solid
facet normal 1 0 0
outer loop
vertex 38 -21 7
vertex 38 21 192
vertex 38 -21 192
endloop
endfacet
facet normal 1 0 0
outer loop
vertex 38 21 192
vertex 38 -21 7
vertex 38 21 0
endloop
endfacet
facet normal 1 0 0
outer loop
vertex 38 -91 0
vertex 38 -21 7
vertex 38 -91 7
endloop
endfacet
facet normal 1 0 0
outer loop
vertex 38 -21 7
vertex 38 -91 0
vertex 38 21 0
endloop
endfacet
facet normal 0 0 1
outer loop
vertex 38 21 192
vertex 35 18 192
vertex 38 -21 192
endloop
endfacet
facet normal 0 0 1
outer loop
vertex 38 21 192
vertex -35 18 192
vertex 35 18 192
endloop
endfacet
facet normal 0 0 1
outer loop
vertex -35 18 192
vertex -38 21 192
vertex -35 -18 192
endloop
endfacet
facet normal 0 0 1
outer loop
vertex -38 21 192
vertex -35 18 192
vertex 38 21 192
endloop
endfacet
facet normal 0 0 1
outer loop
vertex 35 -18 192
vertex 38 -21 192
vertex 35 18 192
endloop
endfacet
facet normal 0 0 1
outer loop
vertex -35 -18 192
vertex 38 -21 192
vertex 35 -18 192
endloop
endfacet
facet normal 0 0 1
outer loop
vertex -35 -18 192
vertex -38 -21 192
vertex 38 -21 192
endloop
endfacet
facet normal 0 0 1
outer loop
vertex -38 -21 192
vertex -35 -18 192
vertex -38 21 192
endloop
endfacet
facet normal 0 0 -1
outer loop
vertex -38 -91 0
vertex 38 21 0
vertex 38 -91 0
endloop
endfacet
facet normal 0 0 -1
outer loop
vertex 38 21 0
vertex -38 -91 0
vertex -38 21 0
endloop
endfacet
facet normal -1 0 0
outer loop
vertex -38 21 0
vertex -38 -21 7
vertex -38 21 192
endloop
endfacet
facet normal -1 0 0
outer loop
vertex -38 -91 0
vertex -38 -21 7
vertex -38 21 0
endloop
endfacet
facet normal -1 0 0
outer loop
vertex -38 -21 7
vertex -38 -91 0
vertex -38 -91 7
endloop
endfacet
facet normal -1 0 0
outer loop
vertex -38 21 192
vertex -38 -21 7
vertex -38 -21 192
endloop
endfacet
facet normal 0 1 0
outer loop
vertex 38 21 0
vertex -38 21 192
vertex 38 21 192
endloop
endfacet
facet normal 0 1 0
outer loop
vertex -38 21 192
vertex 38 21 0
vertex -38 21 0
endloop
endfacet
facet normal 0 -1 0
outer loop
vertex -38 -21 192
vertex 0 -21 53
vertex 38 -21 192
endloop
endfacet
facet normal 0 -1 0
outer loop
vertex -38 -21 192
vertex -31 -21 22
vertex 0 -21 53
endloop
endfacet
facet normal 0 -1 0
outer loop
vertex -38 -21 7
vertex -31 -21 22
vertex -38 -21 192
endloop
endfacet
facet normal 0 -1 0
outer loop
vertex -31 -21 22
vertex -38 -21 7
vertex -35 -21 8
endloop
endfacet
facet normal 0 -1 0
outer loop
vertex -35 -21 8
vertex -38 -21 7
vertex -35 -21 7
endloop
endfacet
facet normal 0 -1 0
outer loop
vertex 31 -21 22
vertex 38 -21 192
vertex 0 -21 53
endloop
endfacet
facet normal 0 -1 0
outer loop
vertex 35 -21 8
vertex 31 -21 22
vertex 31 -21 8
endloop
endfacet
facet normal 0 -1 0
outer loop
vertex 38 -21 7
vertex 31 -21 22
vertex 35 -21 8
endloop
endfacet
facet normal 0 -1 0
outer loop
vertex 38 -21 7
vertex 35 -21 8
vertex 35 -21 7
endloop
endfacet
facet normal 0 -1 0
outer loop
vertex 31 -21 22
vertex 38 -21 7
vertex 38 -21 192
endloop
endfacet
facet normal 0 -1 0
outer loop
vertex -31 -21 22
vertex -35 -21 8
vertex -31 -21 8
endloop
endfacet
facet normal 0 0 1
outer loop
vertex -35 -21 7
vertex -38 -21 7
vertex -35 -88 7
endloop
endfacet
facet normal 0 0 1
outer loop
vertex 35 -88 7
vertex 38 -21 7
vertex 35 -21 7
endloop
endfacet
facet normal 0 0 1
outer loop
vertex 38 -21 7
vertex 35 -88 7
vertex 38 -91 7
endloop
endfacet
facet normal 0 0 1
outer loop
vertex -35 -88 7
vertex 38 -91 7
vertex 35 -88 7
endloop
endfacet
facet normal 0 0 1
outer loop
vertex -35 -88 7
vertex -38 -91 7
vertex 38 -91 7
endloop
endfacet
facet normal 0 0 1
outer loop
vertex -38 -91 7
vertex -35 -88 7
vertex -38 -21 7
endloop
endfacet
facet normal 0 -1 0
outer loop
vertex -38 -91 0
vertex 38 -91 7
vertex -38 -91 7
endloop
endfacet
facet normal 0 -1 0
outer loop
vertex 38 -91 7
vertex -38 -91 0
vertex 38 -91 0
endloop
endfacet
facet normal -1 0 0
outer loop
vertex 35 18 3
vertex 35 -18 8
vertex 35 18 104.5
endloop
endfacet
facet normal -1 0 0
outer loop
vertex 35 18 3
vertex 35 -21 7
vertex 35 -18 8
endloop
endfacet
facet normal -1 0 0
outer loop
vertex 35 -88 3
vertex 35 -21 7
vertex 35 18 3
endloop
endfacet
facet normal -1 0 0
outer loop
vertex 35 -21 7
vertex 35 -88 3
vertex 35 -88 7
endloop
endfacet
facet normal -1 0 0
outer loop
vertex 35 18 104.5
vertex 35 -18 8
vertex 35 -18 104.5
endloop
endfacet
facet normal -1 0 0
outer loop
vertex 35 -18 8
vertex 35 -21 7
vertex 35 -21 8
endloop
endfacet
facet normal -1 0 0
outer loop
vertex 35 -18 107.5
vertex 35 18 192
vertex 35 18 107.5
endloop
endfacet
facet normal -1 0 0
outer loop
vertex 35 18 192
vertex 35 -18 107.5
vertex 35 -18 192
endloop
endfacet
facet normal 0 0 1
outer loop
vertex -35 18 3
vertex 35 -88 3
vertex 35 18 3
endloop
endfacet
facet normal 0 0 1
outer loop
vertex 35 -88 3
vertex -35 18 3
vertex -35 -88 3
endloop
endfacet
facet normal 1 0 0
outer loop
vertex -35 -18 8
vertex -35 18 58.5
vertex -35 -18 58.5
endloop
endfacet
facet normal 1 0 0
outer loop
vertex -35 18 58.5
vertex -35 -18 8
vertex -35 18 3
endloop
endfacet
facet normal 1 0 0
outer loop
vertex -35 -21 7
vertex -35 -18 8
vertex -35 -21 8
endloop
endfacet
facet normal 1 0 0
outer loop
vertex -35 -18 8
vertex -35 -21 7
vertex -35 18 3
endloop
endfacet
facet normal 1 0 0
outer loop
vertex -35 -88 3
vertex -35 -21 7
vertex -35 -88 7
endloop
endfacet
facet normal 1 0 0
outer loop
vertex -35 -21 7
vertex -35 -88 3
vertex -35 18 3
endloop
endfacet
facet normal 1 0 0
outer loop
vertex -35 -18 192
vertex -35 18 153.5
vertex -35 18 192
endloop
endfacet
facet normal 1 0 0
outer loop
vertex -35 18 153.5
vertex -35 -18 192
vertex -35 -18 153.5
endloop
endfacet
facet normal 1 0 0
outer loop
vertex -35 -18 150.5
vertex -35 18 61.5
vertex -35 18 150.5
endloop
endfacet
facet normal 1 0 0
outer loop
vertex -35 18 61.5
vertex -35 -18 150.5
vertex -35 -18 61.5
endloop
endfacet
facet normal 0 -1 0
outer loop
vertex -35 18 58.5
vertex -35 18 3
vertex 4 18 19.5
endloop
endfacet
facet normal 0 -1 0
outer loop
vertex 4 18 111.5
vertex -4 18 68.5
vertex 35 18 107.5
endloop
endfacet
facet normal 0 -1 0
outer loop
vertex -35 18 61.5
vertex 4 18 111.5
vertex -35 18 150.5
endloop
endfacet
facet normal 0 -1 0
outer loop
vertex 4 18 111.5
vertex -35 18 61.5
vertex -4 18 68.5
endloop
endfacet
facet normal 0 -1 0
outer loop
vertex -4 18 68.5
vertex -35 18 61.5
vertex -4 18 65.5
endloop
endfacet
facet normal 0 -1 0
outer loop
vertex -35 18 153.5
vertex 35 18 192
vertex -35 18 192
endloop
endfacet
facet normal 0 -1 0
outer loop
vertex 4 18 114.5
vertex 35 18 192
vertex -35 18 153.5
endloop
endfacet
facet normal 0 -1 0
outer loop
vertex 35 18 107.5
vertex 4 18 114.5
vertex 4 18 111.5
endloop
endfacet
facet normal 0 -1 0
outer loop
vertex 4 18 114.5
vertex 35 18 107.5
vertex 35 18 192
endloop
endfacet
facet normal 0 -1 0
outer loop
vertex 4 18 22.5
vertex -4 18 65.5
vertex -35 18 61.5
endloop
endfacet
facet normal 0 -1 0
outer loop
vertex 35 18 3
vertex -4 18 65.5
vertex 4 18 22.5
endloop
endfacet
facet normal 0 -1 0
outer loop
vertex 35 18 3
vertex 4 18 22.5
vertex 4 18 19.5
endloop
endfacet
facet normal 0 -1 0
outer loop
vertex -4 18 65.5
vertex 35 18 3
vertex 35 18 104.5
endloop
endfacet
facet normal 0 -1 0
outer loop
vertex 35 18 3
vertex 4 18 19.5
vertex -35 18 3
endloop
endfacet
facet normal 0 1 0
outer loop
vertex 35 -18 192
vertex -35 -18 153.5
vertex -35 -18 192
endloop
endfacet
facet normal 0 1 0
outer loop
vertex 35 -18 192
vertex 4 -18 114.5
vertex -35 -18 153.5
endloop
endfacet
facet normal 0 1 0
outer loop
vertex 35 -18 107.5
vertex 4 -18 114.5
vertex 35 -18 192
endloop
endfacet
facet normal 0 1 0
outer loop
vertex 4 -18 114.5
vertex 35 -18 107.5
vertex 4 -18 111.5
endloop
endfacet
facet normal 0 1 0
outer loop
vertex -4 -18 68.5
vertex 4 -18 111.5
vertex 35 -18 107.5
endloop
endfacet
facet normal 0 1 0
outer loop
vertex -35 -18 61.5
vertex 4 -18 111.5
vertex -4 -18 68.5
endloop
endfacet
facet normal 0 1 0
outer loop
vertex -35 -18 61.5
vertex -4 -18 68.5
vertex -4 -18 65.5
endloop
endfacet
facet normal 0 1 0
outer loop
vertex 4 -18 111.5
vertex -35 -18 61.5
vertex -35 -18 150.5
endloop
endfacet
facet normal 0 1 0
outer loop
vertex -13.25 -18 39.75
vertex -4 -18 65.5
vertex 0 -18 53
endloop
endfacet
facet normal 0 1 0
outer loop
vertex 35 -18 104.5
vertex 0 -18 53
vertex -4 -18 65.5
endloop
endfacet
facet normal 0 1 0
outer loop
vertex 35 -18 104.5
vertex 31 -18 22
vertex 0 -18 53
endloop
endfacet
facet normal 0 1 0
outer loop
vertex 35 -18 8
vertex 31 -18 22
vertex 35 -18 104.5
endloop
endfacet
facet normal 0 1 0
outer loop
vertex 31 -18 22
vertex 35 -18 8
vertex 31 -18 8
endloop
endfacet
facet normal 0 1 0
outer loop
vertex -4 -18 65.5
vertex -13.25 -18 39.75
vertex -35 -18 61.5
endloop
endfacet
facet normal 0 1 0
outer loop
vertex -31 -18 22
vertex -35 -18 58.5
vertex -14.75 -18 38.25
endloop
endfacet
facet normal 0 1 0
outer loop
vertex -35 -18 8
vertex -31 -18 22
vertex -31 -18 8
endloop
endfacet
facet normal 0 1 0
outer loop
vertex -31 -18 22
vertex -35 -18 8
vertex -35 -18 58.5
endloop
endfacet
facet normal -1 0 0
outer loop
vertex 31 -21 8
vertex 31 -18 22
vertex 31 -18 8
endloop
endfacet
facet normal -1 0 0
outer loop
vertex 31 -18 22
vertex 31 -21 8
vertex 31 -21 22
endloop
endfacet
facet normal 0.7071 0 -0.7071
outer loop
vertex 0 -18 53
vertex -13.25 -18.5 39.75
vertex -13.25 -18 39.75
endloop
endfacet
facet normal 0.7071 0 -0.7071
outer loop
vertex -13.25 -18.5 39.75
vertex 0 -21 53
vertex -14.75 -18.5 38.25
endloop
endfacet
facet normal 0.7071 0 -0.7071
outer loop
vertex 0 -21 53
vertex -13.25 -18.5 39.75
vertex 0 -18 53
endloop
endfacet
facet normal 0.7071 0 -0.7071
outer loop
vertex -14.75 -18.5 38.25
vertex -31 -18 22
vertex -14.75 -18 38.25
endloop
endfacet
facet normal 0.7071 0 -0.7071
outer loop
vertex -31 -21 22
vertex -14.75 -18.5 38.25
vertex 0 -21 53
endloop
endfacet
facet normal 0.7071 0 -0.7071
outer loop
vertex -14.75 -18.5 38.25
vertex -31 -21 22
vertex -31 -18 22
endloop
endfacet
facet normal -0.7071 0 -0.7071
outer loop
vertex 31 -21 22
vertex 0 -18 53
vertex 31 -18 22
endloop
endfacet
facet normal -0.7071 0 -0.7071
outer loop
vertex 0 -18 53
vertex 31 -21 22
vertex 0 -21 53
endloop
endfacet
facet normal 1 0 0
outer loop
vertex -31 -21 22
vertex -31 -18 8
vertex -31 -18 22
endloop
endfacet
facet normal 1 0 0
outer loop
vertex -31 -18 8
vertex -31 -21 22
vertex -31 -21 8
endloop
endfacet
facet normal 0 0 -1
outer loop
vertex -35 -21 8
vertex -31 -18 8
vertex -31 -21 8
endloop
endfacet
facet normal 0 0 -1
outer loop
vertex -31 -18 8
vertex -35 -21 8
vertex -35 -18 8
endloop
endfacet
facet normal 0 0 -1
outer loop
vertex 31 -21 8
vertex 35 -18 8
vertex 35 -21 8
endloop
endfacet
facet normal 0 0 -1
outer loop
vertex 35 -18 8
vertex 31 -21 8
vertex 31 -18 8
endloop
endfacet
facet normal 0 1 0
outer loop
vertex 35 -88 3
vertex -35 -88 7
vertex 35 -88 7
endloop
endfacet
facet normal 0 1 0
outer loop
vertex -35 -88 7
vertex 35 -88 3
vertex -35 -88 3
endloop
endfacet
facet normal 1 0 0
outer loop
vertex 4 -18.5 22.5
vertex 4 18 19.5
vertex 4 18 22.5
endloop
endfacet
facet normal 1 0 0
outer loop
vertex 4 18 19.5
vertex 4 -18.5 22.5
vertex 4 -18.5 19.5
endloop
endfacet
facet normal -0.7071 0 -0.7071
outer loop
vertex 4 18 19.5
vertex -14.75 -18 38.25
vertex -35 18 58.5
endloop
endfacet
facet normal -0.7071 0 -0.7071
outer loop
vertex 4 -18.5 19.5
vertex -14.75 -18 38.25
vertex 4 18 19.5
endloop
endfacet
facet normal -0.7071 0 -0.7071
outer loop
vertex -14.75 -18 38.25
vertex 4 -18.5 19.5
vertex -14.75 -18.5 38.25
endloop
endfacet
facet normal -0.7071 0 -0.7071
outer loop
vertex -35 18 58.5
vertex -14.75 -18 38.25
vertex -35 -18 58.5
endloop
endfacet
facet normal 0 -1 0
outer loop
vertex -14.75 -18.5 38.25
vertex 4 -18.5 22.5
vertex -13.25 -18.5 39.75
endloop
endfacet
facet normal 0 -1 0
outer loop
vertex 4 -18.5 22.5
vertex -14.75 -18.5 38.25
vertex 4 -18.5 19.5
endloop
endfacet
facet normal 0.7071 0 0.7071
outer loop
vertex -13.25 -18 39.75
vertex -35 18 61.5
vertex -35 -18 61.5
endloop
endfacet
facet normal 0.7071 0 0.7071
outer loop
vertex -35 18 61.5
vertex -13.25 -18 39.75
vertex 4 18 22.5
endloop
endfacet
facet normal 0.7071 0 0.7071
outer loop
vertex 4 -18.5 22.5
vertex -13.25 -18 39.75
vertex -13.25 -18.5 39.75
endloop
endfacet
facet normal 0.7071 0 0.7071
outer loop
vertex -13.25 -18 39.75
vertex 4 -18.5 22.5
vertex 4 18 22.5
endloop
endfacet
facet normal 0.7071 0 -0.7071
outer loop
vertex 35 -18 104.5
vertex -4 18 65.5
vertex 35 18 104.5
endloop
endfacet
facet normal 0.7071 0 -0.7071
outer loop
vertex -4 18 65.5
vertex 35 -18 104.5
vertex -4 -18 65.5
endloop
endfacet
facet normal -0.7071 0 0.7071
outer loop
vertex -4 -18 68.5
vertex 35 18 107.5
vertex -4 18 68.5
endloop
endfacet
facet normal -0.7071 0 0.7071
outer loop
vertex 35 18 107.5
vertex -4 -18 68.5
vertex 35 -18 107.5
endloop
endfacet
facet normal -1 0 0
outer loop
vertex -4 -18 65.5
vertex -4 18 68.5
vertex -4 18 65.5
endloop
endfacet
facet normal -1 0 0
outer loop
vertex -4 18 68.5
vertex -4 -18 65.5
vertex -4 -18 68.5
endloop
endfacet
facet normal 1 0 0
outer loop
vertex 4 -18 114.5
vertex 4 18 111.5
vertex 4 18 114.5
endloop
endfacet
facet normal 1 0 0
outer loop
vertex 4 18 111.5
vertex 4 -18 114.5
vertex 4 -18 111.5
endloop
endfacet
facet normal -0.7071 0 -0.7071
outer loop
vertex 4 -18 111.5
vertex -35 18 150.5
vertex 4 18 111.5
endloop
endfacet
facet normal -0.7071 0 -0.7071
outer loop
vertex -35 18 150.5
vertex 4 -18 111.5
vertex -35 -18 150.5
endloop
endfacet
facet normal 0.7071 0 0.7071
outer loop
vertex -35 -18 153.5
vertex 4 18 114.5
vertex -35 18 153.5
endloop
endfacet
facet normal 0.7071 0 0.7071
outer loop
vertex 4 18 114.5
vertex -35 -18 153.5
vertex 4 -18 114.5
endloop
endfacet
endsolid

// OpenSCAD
// Modular dice tower with zig-zag ramps and a rolling tray - original parametric design.
// Chamber is 70 mm wide so a d20 (up to 29 mm) always passes the 31 mm gap at the end of every ramp.
// Ramps slope at 45 degrees with a parallel underside, so the tower prints standing up with no supports.
ramps   = 3;       // number of ramps (2 = short tower, 3 = tall tower)
cx      = 70;      // chamber width (mm)
cy      = 36;      // chamber depth (mm)
wall    = 3;
gap     = 31;      // clear gap left at the end of each ramp (mm)
rt      = 3;       // vertical ramp thickness (mm)
pitch   = 46;      // vertical distance between ramps (mm)
win_h   = 50;      // exit window height at the peak (mm), floor to apex
tray_l  = 70;      // rolling tray length in front of the tower (mm)
rim     = 4;       // tray rim height (mm)
floor_t = 3;

L  = cx - gap;                         // ramp horizontal length (45 deg drop = L)
z1 = floor_t + 34 + L - 14;         // top of the lowest ramp at its wall
H  = z1 + (ramps - 1) * pitch + 38;    // tower height
ow = cx + 2*wall; od = cy + 2*wall;
echo(str("DICE_TOWER outer=", ow, "x", od + tray_l, "x", H));

module ramp(z, from_left) {
    // polygon in XZ, extruded along Y across the chamber (overlaps the side walls so it fuses)
    xs = from_left ? -cx/2 - 0.5 : cx/2 + 0.5;
    dx = from_left ? 1 : -1;
    translate([0, cy/2 + 0.5, 0]) rotate([90, 0, 0]) linear_extrude(height = cy + 1)
        polygon([[xs, z], [xs + dx*(L + 0.5), z - L - 0.5], [xs + dx*(L + 0.5), z - L - 0.5 - rt*1.0], [xs, z - rt]]);
}

difference() {
    union() {
        // tower body
        translate([-ow/2, -od/2, 0]) cube([ow, od, H]);
        // rolling tray in front (towards -Y)
        translate([-ow/2, -od/2 - tray_l, 0]) cube([ow, tray_l + 1, floor_t + rim]);
    }
    // chamber
    translate([-cx/2, -cy/2, floor_t]) cube([cx, cy, H]);
    // exit window through the front wall
    // gable-shaped (45 deg) so the lintel needs no bridging
    translate([0, -od/2 + wall + 1, floor_t]) rotate([90, 0, 0]) linear_extrude(height = wall + 2)
        polygon([[-(cx/2 - 4), 0], [cx/2 - 4, 0], [cx/2 - 4, win_h - (cx/2 - 4)], [0, win_h], [-(cx/2 - 4), win_h - (cx/2 - 4)]]);
    // tray pocket
    translate([-ow/2 + wall, -od/2 - tray_l + wall, floor_t]) cube([ow - 2*wall, tray_l + 1, rim + 1]);
}
for (i = [0 : ramps - 1])
    ramp(z1 + i*pitch, i % 2 == 0);
